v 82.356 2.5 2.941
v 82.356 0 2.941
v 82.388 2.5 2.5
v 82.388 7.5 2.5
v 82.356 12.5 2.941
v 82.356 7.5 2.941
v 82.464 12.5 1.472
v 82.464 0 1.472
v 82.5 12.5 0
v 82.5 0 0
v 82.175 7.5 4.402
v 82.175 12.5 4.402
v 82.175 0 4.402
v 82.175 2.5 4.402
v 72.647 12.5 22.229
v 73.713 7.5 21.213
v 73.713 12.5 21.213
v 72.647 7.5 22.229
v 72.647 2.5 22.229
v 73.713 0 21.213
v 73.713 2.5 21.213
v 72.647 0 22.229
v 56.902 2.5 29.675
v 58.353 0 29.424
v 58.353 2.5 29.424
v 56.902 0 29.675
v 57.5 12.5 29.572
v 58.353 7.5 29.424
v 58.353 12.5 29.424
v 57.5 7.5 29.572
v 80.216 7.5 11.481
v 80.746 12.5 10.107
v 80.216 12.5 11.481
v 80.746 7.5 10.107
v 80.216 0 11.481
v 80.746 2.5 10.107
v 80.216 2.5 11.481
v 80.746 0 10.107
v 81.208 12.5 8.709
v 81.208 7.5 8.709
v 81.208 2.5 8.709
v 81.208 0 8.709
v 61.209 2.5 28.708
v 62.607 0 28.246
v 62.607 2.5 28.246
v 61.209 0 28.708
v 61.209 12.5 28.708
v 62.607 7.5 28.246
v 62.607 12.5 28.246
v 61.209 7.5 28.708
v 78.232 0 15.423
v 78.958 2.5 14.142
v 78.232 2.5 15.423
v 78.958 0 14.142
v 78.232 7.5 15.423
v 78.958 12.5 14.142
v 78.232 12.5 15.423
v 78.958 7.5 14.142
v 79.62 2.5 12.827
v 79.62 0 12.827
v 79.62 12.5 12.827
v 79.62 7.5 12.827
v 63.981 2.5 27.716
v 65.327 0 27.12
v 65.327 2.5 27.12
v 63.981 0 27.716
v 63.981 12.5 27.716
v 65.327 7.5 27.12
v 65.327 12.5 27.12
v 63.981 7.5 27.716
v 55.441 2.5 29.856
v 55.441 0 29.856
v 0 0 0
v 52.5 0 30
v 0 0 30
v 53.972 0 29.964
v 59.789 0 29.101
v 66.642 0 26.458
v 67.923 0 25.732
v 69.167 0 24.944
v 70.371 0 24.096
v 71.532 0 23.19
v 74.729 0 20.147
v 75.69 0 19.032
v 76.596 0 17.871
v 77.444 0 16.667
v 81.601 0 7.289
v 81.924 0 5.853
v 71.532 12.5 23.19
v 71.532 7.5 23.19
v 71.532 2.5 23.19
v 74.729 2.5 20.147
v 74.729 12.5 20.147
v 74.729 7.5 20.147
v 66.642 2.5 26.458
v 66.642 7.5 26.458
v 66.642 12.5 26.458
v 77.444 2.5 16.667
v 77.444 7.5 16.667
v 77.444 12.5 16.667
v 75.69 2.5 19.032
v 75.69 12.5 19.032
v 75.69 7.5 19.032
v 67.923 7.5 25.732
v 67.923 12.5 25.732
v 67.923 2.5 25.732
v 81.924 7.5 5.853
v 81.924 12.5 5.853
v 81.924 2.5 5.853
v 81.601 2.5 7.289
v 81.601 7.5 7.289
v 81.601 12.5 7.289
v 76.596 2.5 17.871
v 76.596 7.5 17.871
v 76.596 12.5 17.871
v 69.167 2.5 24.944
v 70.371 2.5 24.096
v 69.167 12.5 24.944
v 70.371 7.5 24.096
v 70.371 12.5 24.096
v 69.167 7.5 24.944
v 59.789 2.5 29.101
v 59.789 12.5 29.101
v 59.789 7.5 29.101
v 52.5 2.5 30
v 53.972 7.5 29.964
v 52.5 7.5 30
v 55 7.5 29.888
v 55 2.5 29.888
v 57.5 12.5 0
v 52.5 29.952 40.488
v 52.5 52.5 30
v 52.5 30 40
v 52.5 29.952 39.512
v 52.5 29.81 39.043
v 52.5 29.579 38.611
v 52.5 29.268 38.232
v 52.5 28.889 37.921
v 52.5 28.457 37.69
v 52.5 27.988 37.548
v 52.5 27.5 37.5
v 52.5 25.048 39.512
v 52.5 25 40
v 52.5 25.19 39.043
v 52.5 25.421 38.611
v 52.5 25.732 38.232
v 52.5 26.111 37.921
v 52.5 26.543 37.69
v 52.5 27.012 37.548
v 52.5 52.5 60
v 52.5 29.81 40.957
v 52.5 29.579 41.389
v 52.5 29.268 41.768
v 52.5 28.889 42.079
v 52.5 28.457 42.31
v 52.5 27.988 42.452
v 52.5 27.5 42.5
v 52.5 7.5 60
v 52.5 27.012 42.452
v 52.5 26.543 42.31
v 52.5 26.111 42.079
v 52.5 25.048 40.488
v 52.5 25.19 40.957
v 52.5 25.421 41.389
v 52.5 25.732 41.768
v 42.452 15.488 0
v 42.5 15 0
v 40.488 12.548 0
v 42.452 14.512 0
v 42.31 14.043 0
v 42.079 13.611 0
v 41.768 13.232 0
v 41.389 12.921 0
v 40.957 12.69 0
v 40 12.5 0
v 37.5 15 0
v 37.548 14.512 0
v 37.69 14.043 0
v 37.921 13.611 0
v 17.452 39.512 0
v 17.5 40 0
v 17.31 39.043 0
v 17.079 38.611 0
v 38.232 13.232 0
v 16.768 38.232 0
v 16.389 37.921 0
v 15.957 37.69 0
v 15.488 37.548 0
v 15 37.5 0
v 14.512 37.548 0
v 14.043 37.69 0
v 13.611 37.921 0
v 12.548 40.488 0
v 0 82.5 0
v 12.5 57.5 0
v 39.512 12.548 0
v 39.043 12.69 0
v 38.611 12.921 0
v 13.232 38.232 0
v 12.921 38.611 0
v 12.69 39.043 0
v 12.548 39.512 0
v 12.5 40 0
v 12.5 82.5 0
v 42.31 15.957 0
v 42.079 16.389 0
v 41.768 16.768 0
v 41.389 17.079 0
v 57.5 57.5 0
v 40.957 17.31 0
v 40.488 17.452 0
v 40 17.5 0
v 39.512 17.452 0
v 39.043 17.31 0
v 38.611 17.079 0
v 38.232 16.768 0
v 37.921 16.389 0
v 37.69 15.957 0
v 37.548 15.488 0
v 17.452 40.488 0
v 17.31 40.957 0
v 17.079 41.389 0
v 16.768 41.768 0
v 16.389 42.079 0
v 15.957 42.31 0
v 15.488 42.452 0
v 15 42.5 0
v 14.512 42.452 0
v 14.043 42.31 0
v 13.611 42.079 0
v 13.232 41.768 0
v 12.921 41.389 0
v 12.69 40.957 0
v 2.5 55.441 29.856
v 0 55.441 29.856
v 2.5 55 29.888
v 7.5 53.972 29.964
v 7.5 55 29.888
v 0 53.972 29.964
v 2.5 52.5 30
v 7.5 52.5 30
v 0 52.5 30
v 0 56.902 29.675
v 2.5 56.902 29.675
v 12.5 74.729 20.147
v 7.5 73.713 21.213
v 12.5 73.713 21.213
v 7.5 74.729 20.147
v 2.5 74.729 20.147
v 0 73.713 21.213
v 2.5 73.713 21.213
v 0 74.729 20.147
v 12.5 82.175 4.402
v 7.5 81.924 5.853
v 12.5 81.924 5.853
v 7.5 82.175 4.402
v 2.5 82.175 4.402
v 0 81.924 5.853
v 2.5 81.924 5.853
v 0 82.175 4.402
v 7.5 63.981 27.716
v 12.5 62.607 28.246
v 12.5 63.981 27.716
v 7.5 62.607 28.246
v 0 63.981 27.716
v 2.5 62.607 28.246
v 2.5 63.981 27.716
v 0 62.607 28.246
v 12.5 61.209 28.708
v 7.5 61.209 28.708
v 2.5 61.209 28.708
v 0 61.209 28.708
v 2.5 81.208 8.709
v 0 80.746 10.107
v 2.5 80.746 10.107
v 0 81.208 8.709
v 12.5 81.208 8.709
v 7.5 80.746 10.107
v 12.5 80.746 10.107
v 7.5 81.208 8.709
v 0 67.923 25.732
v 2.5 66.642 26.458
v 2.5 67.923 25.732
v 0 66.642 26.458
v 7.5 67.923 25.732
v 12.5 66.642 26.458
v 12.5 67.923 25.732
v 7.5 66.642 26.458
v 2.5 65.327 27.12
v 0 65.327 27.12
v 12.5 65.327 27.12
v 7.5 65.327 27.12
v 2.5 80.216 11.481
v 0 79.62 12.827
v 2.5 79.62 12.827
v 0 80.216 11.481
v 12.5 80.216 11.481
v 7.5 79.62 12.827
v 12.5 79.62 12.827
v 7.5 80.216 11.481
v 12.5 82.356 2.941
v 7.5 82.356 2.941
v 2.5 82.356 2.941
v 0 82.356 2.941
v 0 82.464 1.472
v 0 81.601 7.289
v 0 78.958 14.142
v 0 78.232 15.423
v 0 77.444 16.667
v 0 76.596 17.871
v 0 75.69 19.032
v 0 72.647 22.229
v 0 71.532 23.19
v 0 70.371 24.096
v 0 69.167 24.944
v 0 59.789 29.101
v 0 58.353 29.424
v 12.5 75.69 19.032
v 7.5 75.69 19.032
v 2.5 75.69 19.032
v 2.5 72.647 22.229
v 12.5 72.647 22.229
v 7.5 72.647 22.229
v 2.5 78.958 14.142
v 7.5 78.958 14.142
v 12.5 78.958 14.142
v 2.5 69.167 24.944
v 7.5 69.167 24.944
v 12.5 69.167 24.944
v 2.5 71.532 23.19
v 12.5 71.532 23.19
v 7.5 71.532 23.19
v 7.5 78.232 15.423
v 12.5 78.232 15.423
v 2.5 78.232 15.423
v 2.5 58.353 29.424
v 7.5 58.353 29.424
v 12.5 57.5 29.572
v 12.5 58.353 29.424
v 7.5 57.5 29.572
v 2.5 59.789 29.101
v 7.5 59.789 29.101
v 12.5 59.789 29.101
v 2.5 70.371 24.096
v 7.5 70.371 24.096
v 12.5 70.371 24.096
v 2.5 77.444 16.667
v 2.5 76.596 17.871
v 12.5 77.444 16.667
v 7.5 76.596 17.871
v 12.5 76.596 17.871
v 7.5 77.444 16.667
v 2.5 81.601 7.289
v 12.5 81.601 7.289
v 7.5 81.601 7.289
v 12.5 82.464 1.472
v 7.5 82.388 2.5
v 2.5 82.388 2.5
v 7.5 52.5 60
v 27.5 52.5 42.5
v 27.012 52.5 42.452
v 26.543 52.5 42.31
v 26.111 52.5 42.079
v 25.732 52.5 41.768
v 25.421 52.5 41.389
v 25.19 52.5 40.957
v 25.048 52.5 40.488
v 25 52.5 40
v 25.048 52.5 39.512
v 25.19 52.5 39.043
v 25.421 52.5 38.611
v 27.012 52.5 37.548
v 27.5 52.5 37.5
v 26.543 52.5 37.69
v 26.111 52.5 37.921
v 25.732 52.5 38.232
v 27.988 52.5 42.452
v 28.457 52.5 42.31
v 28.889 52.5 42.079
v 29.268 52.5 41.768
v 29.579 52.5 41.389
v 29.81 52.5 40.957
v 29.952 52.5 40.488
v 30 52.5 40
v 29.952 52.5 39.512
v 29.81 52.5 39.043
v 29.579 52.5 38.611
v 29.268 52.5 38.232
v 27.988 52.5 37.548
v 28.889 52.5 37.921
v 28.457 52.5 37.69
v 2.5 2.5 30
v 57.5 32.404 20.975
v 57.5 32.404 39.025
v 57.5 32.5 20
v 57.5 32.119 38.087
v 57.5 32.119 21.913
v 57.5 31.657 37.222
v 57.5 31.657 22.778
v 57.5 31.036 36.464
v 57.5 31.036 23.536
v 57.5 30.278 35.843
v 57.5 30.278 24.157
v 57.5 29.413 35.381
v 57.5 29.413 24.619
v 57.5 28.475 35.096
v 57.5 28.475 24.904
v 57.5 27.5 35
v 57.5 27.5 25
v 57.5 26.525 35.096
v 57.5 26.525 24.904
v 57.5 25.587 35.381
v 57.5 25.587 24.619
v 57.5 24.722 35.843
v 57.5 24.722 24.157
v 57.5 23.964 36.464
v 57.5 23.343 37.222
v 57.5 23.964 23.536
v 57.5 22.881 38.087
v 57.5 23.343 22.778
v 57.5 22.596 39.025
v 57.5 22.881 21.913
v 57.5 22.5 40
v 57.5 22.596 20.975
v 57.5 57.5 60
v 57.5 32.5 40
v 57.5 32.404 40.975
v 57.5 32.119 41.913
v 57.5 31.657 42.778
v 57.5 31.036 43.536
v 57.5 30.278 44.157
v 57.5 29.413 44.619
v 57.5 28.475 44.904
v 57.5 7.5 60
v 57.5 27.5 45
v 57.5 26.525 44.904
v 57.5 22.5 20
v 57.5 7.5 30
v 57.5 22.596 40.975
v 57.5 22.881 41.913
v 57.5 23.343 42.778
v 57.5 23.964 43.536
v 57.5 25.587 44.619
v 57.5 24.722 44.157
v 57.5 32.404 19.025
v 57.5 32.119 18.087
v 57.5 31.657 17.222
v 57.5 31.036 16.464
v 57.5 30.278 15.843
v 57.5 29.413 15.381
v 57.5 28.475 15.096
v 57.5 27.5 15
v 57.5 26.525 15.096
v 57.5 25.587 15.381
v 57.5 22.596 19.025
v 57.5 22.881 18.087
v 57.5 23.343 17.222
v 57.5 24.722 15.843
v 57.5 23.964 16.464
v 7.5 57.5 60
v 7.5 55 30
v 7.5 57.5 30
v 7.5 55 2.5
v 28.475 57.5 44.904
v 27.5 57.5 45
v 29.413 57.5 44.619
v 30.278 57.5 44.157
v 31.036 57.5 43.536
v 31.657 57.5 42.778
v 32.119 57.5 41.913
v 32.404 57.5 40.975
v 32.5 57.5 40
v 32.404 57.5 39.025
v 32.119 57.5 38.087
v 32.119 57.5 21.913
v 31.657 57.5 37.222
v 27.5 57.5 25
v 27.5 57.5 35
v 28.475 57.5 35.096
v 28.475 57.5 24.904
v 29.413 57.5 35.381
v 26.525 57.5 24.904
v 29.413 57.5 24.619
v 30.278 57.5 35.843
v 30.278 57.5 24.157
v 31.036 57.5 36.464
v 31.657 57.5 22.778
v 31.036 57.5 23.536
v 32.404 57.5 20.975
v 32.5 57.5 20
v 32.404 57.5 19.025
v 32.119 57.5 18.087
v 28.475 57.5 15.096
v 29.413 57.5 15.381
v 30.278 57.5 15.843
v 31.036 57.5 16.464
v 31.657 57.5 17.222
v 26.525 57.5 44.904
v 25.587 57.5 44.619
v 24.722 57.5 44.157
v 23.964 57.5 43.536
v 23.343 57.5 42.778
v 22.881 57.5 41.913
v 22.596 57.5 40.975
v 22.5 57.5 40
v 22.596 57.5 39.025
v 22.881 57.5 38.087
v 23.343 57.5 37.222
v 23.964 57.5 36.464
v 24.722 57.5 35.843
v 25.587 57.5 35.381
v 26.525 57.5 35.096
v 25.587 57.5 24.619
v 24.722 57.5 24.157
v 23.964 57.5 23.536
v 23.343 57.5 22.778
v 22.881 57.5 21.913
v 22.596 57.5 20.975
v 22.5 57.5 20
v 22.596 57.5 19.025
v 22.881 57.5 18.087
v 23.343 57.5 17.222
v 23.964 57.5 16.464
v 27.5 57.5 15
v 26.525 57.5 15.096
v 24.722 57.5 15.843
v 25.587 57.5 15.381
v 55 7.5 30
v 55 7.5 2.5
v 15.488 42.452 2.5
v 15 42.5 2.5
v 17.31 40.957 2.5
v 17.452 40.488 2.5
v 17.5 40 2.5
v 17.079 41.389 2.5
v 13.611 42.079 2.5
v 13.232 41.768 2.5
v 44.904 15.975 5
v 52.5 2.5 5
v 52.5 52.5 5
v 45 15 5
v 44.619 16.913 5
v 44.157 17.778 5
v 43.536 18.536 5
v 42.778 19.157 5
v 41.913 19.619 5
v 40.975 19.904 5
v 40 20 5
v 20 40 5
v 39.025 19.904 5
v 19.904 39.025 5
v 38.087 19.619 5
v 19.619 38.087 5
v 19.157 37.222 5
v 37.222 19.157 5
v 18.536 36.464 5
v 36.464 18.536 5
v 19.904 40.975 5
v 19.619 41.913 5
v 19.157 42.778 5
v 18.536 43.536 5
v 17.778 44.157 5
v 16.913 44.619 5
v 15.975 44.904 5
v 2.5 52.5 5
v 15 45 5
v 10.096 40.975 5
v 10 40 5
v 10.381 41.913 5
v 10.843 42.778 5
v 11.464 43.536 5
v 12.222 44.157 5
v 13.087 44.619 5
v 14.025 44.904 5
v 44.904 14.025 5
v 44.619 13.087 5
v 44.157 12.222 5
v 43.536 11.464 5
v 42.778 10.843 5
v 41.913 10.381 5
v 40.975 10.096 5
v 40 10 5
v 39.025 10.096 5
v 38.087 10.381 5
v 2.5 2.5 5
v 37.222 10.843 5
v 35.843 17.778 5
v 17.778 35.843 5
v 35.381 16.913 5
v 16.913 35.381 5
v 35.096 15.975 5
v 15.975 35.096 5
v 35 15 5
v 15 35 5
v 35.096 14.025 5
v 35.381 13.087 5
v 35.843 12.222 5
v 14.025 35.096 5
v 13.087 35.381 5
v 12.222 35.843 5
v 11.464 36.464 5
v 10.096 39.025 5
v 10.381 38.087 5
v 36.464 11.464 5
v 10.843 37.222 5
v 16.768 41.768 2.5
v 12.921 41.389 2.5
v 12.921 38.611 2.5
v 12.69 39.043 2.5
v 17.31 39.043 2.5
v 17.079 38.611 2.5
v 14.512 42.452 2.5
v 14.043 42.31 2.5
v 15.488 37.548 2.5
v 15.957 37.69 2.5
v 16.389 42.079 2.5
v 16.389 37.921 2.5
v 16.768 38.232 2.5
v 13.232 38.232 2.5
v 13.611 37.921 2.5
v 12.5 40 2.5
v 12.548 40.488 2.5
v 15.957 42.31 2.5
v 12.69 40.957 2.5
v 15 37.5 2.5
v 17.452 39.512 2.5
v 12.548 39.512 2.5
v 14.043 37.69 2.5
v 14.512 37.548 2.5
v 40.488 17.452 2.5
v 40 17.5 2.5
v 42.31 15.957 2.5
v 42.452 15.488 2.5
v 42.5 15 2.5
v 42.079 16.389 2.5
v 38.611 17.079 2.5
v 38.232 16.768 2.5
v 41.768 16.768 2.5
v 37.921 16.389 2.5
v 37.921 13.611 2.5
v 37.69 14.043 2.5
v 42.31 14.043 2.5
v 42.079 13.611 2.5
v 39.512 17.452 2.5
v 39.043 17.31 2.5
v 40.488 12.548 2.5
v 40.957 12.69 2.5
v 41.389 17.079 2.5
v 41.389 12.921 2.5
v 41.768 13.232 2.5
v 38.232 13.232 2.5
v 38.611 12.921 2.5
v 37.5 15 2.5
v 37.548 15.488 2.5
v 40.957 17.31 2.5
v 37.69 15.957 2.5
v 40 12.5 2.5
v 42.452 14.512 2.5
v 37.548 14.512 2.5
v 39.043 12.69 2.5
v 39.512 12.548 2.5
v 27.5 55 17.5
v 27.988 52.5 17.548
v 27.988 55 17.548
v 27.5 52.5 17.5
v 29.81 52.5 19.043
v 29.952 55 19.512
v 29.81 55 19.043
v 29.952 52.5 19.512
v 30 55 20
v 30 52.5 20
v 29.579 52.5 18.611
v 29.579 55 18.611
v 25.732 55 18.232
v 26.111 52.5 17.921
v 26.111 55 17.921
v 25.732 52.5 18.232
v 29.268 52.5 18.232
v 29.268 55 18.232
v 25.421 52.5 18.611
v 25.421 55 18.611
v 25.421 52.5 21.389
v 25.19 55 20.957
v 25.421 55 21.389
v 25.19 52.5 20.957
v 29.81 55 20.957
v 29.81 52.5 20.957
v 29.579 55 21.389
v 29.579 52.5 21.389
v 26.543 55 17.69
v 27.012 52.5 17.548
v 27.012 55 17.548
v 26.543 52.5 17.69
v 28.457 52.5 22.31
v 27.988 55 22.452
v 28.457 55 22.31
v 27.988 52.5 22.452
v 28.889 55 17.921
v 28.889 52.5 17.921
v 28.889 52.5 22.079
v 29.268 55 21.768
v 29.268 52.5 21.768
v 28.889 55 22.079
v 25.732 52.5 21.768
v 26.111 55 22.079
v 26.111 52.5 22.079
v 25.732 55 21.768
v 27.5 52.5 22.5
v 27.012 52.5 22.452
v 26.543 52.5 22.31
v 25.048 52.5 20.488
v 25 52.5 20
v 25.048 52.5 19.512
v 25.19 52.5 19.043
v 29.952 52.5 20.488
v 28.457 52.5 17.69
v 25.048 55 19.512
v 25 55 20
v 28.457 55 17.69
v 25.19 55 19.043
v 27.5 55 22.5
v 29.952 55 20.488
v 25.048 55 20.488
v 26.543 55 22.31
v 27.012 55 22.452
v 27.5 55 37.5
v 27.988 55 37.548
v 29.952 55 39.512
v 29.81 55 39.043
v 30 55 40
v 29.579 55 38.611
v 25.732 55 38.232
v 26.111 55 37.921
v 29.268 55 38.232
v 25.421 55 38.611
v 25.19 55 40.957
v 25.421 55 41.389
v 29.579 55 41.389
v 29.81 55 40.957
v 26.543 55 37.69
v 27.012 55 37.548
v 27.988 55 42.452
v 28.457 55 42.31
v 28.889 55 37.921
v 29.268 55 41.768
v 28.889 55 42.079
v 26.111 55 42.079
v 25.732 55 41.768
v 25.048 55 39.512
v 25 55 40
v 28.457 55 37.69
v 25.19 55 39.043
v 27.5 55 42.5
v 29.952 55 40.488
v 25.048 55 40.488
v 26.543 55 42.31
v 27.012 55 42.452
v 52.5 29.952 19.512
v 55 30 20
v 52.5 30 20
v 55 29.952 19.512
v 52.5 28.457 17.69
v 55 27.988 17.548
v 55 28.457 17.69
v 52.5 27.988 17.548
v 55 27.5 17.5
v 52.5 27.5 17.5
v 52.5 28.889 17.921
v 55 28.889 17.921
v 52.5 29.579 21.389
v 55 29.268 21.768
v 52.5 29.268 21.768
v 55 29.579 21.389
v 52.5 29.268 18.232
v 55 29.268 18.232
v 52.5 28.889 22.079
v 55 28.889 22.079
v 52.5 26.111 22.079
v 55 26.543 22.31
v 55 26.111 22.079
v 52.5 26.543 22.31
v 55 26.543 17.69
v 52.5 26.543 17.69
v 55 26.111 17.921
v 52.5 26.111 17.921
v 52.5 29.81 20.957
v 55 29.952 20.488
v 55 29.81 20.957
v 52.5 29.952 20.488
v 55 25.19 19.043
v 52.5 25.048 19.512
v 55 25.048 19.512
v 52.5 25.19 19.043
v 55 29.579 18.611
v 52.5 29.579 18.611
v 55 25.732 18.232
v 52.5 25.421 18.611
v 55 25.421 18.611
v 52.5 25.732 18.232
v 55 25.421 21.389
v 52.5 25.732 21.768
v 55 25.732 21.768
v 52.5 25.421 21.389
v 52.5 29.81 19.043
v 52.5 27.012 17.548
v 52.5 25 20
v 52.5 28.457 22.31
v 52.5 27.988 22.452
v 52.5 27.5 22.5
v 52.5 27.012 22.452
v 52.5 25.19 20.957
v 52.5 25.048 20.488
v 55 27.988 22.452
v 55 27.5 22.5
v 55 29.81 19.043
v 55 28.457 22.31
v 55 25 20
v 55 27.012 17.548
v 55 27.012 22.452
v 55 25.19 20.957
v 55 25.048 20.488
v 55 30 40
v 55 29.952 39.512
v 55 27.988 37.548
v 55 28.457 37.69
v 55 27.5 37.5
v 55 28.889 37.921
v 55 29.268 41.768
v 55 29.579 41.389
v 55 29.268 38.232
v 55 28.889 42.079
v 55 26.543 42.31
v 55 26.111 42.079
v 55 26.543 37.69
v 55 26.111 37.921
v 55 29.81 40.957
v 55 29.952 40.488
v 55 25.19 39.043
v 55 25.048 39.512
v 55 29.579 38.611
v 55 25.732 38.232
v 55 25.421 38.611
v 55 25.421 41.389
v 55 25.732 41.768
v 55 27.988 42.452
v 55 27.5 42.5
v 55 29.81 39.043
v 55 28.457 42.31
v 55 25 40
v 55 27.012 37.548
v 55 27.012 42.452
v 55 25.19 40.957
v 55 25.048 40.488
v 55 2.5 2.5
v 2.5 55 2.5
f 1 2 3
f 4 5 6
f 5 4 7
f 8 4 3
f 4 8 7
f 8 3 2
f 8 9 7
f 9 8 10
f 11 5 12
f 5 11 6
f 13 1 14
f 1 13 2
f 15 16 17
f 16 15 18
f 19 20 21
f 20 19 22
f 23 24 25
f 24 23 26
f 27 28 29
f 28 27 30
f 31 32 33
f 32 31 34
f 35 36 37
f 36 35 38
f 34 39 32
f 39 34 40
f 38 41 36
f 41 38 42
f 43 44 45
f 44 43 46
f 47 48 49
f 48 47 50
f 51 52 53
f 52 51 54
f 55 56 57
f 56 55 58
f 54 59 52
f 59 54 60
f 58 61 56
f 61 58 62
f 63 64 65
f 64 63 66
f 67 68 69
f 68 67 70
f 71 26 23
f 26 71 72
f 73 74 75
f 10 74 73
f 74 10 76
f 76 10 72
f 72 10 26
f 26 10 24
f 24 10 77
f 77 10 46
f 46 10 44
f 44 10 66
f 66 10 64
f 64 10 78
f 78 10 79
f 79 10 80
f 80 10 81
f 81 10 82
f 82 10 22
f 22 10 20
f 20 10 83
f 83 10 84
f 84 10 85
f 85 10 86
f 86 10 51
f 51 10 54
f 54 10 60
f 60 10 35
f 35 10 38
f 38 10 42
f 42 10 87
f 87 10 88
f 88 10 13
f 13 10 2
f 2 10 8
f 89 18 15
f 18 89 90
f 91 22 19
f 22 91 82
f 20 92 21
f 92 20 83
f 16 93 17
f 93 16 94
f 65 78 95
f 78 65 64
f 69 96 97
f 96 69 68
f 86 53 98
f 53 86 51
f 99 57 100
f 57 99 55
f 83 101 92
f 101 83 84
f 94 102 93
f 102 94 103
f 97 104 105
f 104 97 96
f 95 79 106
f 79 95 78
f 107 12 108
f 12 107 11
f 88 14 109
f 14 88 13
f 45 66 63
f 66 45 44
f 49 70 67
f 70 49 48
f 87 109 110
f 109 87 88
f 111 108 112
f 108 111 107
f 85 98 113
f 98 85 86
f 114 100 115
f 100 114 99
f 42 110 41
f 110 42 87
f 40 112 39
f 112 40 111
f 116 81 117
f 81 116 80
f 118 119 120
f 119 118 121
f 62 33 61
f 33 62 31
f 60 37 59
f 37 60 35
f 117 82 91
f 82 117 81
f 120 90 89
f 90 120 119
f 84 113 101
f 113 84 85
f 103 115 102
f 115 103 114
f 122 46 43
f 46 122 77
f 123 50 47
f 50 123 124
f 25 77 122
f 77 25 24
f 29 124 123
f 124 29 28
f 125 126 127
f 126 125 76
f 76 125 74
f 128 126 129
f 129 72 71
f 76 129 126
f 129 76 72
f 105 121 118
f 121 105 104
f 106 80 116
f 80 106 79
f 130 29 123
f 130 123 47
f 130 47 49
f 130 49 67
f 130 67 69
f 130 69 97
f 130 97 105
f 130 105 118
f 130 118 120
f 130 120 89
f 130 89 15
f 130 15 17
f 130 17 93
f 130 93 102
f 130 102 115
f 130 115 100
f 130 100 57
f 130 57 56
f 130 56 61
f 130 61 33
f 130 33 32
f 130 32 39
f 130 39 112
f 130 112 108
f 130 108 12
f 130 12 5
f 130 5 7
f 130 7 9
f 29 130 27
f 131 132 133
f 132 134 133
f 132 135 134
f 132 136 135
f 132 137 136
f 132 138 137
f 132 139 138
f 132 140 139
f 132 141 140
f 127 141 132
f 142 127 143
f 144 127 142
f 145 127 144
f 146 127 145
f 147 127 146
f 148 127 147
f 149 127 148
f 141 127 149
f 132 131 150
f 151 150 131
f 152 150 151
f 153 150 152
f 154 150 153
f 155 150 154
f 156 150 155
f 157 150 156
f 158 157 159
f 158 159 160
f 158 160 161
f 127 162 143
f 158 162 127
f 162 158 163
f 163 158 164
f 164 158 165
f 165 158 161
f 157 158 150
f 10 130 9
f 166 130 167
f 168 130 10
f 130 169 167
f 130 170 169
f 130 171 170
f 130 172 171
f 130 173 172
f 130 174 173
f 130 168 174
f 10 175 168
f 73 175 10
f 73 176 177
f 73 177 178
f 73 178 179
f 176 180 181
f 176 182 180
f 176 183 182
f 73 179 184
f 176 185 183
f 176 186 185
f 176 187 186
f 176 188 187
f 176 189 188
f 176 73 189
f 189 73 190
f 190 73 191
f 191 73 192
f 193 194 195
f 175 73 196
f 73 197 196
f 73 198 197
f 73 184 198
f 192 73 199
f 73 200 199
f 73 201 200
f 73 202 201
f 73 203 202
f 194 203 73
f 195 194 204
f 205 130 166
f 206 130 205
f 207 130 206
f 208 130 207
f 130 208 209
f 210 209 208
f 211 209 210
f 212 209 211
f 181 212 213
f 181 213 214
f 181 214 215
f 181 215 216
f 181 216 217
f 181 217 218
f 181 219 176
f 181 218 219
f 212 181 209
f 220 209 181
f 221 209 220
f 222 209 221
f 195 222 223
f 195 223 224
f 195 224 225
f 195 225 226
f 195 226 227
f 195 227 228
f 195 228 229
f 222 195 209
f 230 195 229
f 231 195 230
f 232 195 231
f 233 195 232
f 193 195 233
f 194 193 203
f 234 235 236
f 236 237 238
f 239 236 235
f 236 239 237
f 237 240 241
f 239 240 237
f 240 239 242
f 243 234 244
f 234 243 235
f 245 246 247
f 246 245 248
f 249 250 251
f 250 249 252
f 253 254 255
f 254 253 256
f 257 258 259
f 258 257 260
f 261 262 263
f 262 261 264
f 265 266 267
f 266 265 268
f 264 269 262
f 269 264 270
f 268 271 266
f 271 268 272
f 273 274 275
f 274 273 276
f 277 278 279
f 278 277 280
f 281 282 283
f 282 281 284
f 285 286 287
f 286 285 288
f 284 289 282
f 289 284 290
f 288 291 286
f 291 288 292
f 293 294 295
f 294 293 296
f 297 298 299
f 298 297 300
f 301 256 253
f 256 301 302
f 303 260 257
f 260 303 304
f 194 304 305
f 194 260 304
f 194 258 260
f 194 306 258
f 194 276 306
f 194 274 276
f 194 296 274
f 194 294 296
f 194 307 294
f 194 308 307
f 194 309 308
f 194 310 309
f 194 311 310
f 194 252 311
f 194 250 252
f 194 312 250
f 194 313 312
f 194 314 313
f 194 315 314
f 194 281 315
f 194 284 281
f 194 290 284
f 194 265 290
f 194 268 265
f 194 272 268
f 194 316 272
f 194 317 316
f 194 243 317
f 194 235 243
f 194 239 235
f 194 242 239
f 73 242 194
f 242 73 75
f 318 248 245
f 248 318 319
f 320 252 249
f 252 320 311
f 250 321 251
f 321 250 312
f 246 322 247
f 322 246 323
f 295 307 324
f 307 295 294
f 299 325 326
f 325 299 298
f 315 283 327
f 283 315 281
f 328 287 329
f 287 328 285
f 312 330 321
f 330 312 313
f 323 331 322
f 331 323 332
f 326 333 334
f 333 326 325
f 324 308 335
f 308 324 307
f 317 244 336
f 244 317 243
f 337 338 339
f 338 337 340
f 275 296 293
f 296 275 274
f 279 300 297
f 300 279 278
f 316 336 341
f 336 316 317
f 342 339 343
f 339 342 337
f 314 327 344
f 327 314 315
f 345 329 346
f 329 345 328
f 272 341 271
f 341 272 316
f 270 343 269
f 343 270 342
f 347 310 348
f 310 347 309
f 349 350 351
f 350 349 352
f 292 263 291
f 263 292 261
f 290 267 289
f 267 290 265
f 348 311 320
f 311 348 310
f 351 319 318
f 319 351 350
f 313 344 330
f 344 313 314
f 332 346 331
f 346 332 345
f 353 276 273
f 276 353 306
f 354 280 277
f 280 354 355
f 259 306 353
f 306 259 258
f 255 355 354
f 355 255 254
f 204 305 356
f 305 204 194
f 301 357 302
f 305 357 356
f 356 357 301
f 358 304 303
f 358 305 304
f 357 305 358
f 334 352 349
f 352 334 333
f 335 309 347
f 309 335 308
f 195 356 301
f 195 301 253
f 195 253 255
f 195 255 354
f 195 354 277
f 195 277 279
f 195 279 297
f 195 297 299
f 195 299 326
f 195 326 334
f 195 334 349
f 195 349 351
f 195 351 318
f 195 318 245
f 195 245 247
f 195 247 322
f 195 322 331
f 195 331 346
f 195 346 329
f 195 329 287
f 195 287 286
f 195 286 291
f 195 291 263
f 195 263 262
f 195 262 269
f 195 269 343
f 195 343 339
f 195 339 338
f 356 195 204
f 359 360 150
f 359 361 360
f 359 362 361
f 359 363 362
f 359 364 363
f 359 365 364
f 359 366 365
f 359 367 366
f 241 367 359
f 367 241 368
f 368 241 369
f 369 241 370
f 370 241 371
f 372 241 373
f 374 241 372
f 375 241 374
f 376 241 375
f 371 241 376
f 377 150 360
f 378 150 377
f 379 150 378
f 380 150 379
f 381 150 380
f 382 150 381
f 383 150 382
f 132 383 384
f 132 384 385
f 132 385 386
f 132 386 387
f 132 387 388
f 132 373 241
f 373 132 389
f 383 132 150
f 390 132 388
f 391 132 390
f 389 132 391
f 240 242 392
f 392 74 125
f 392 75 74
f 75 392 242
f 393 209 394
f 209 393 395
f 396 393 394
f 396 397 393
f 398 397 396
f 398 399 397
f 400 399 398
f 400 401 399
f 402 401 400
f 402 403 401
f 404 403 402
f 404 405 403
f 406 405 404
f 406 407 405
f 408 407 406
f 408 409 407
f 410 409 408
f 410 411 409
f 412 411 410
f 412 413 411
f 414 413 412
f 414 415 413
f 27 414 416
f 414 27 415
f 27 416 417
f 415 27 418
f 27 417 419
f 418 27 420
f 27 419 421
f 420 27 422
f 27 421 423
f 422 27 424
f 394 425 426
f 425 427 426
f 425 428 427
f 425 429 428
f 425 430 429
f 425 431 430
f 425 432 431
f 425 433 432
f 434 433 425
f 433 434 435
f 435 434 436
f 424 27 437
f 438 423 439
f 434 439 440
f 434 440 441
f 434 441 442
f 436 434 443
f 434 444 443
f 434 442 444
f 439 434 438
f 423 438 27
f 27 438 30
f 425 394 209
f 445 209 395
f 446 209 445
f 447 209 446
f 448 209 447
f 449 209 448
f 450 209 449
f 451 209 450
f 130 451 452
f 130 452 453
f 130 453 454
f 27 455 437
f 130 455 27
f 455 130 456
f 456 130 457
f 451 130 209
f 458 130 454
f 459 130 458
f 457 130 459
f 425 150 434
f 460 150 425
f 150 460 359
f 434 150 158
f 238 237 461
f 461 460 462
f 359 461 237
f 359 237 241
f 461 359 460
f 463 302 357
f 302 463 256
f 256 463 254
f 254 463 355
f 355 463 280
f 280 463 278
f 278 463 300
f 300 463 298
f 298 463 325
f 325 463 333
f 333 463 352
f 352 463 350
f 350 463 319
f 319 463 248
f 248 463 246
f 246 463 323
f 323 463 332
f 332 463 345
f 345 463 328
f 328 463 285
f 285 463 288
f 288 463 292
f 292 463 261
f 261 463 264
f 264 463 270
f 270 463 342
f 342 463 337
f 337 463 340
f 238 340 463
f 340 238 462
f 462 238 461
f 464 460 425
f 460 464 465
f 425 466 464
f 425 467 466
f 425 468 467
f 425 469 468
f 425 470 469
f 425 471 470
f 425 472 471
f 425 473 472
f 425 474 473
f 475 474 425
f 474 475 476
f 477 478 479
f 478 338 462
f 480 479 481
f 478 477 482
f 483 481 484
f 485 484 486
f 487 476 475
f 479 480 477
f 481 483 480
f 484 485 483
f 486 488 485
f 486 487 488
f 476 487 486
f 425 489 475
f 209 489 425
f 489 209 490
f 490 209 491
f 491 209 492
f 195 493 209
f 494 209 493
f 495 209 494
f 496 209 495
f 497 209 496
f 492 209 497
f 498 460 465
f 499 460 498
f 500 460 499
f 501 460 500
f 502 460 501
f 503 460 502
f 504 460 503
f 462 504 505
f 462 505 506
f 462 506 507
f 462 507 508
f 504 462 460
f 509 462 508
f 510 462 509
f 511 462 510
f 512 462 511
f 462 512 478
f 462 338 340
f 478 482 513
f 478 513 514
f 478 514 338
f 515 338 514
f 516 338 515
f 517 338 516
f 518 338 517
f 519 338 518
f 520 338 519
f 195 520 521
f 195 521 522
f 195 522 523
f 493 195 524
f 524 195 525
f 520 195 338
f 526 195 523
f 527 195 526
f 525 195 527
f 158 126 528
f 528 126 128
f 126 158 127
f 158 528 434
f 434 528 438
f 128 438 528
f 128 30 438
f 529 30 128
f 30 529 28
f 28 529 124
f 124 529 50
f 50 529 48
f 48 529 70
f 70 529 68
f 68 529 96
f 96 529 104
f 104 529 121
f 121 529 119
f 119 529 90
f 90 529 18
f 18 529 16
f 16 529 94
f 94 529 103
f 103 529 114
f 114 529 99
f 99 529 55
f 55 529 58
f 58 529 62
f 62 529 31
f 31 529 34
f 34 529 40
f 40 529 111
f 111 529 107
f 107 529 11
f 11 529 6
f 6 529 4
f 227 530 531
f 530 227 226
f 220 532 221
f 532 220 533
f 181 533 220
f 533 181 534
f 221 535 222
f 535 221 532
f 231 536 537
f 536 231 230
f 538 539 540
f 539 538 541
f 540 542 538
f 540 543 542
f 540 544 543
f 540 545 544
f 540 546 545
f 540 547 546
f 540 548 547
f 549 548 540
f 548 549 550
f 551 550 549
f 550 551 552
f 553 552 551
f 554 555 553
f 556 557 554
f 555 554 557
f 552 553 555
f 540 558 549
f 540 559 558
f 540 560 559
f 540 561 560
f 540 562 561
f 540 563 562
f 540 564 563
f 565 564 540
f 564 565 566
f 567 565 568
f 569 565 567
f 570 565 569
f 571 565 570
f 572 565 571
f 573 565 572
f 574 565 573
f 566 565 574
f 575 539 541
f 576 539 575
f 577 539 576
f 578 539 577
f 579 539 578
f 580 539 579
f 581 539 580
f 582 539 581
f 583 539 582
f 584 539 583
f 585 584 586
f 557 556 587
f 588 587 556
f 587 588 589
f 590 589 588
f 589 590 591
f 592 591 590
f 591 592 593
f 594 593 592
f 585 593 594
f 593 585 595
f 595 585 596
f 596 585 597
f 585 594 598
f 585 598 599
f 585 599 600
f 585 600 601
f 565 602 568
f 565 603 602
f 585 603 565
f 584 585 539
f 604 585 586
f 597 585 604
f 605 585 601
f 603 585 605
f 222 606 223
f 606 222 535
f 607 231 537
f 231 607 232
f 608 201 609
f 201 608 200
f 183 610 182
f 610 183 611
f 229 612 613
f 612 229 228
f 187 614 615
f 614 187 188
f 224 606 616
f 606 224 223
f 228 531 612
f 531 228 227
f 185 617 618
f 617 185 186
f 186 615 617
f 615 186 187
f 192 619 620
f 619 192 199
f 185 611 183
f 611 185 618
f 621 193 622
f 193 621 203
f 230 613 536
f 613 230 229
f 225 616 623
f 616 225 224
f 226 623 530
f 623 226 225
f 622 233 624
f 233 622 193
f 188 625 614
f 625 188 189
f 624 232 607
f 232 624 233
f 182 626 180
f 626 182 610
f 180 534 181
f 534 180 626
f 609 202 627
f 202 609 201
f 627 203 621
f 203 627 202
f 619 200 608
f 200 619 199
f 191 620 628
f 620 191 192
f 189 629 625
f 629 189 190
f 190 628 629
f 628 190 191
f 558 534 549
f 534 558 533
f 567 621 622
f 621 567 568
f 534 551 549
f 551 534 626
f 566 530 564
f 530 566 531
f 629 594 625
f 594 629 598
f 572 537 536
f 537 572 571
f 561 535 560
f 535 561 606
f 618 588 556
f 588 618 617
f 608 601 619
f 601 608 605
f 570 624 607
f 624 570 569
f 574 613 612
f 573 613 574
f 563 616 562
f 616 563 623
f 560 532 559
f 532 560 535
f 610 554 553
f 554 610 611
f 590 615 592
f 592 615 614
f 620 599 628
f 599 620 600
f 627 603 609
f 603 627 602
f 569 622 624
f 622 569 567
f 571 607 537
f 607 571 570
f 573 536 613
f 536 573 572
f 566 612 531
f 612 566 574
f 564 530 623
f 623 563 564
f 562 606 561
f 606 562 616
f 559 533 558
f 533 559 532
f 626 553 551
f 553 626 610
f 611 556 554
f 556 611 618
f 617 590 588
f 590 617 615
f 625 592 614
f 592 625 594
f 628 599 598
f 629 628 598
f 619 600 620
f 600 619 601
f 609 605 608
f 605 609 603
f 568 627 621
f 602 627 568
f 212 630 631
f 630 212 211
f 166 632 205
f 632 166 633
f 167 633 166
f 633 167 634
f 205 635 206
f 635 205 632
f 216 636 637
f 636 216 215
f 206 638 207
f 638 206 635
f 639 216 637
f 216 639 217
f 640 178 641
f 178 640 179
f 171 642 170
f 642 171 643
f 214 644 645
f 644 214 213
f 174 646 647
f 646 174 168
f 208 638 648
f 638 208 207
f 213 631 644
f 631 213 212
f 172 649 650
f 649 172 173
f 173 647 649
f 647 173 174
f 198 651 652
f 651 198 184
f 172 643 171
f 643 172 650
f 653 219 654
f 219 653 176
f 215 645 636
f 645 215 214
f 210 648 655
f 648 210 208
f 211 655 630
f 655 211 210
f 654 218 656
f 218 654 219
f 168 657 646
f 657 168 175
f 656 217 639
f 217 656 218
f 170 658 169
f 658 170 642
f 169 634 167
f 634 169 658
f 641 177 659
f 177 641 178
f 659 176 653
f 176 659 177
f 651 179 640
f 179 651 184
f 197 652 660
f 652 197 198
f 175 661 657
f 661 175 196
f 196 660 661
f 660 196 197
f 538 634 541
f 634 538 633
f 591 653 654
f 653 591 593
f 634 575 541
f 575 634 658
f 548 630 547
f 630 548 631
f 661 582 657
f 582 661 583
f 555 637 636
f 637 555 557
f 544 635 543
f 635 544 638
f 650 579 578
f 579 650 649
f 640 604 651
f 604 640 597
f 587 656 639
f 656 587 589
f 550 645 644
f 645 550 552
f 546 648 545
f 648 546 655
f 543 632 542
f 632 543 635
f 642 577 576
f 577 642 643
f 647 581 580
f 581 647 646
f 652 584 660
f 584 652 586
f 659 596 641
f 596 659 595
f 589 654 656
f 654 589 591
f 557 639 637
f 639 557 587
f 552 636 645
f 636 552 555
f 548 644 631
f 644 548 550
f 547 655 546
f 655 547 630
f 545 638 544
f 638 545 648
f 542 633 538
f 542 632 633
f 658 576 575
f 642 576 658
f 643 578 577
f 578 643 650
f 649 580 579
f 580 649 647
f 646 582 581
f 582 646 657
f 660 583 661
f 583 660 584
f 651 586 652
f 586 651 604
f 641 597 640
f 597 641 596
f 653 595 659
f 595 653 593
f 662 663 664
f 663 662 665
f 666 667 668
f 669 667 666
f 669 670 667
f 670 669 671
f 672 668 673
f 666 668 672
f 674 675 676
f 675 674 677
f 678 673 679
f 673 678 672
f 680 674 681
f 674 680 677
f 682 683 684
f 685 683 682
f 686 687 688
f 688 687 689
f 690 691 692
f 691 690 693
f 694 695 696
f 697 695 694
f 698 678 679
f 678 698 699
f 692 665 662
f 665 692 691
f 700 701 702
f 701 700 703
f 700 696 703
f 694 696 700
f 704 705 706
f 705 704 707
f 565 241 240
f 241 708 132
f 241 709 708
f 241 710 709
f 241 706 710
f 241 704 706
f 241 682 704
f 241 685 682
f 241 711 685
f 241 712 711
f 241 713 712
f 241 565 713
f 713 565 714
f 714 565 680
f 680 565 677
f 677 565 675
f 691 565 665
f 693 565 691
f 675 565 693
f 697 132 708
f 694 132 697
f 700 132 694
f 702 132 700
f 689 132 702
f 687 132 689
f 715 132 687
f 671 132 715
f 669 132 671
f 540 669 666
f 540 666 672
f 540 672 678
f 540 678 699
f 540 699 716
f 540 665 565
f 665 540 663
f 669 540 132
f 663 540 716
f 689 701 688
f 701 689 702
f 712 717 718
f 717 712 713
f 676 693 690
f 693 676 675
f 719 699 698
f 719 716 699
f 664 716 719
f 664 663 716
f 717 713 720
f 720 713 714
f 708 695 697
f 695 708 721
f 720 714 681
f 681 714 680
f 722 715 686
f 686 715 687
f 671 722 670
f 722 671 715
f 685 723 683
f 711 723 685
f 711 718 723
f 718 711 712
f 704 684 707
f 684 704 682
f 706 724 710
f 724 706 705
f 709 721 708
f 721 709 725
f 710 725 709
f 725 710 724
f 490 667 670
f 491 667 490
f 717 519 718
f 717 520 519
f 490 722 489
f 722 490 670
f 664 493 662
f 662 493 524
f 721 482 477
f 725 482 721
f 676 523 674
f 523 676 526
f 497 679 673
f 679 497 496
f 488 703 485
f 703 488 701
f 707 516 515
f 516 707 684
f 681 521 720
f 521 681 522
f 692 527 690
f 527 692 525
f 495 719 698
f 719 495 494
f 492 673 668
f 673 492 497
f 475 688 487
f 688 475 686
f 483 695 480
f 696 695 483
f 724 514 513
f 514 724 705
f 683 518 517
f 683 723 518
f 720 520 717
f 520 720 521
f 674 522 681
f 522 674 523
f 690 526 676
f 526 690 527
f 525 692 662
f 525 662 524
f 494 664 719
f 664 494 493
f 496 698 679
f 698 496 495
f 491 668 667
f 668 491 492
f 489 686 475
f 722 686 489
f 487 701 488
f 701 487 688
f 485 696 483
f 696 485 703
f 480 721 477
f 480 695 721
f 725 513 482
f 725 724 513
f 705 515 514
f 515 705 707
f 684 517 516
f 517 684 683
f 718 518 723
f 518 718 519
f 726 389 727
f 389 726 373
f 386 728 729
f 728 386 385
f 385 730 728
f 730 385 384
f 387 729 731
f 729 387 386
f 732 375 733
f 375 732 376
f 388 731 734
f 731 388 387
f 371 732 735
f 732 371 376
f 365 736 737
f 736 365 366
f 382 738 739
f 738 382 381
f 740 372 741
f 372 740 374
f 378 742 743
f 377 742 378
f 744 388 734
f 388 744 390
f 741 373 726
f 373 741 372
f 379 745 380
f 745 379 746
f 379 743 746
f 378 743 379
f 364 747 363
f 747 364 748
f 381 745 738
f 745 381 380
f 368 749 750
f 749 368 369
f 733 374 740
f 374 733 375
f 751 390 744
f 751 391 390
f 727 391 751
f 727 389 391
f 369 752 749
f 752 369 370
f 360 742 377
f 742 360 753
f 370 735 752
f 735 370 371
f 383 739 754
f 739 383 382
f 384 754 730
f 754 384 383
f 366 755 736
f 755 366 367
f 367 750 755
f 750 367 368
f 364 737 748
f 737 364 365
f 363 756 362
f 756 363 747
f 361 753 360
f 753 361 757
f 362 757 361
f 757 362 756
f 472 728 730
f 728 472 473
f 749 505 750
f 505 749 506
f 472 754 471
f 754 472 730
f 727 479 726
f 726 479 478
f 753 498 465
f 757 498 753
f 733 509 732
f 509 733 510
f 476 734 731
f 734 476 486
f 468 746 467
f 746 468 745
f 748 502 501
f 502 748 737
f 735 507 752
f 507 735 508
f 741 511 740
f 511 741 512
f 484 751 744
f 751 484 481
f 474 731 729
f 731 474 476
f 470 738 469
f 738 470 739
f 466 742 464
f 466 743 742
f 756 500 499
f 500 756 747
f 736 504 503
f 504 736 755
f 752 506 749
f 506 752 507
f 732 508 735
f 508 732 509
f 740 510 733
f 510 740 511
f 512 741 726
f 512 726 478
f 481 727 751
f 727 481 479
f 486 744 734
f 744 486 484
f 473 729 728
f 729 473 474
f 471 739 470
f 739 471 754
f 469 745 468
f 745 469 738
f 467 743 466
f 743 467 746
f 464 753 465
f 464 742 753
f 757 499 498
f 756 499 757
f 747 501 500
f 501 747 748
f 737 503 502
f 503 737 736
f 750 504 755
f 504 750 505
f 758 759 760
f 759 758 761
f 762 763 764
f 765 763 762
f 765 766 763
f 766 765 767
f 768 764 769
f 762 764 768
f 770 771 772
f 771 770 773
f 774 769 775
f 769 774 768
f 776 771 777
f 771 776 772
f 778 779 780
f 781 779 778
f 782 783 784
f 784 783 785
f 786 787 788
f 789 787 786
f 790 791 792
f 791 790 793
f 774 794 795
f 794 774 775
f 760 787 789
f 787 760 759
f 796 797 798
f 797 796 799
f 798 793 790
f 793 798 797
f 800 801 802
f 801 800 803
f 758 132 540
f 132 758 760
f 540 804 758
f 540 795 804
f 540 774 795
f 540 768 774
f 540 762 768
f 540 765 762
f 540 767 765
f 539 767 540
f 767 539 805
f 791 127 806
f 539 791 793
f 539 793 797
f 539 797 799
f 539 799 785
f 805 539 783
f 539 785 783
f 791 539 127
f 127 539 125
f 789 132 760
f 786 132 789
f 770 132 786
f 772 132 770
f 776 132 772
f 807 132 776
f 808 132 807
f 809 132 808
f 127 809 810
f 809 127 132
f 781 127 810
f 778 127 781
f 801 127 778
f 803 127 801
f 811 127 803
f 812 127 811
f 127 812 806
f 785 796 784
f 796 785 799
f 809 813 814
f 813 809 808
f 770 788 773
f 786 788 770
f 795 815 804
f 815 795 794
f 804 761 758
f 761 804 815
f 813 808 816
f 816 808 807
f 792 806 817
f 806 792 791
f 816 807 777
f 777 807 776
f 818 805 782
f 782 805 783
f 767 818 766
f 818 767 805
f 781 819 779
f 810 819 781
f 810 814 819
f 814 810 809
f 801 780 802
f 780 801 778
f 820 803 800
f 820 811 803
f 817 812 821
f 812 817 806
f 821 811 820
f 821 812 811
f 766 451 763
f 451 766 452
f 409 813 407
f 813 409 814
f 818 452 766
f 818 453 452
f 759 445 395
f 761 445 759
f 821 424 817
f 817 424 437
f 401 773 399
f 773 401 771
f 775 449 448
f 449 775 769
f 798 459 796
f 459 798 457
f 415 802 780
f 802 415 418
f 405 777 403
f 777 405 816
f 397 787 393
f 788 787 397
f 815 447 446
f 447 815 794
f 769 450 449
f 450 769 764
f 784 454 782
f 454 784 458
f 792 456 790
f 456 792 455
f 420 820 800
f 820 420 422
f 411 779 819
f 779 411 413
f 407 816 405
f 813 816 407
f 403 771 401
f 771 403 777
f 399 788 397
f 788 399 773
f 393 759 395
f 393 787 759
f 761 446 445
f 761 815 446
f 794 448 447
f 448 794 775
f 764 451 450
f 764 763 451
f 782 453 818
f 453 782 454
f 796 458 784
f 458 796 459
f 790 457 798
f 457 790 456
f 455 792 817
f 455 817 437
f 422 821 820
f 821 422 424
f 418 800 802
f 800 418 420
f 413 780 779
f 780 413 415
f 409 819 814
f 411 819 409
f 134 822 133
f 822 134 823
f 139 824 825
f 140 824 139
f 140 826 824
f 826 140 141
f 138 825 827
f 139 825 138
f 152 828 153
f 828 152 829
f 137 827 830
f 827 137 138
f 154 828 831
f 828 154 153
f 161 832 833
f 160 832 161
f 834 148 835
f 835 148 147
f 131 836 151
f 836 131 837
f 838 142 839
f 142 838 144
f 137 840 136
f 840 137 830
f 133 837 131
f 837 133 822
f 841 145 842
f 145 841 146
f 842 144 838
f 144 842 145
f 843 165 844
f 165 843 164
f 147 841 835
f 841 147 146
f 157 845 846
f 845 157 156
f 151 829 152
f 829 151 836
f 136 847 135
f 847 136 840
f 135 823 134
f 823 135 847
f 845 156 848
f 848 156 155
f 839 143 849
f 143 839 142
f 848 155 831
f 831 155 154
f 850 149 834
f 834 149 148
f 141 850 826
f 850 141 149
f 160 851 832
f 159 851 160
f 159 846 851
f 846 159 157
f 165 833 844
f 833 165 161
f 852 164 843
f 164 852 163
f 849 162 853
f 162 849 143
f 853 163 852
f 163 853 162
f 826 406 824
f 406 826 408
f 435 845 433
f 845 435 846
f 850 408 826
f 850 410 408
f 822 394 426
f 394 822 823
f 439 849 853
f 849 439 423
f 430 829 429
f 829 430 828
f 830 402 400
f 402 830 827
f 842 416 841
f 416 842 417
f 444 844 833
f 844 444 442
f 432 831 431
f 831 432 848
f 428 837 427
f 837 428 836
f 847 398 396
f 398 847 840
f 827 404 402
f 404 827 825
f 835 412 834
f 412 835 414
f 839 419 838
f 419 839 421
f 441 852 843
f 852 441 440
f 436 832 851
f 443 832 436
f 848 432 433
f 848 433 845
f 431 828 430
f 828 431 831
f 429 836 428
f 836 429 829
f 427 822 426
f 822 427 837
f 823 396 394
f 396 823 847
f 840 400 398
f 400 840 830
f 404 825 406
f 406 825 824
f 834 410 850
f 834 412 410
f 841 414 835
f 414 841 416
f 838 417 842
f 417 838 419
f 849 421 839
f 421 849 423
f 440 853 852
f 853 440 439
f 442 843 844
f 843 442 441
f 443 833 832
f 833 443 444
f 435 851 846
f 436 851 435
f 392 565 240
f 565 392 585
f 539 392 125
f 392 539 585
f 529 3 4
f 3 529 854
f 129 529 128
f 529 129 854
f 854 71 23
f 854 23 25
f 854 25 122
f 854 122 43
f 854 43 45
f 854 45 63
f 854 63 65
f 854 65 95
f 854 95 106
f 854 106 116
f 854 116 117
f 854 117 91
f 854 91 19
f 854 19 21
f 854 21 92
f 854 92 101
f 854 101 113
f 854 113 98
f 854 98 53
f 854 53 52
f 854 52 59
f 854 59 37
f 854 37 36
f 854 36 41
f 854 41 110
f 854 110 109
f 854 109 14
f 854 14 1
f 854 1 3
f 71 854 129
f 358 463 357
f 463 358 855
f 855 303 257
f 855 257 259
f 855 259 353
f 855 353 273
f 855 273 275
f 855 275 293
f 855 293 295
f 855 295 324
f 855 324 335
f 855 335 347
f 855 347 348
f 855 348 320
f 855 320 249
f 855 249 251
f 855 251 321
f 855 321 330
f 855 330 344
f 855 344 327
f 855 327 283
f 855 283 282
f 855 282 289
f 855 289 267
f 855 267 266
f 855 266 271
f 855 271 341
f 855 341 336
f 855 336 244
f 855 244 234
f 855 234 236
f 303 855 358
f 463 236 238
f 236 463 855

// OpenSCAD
module m5csk() {
    cylinder(d=5, h=5, $fn=32);
    cylinder(d2=10, d1=0, h=5, $fn=32);
}

module quarter_cylinder(r, h) {
    $fn=128;
    intersection() {
        cylinder(r=r, h=h);
        cube([r, r, h]);
    }
}


difference() {
    union() {
        cube([52.5, 52.5, 30]);
        translate([52.5, 12.5, 0]) rotate([90, 0, 0]) quarter_cylinder(30, 12.5); 
        translate([12.5, 52.5, 0]) rotate([0, -90, 0]) quarter_cylinder(30, 12.5);
        translate([7.5, 52.5, 0]) cube([57.5-7.5, 5, 60]);
        translate([52.5, 7.5, 0]) cube([5, 57.5-7.5, 60]);  
    }
    translate([2.5, 2.5, 5]) cube([50, 50, 25]);
    translate([55, 2.5, 2.5]) cube([27.5, 5, 27.5]);
    translate([2.5, 55, 2.5]) cube([5, 27.5, 27.5]);
    translate([15, 40, 0]) m5csk();
    translate([40, 15, 0]) m5csk();
    translate([27.5, 52.5, 20]) rotate([-90, 0, 0]) m5csk();
    translate([27.5, 52.5, 40]) rotate([-90, 0, 0]) m5csk();
    translate([52.5, 27.5, 20]) rotate([0, 90, 0]) m5csk();
    translate([52.5, 27.5, 40]) rotate([0, 90, 0]) m5csk();
}
